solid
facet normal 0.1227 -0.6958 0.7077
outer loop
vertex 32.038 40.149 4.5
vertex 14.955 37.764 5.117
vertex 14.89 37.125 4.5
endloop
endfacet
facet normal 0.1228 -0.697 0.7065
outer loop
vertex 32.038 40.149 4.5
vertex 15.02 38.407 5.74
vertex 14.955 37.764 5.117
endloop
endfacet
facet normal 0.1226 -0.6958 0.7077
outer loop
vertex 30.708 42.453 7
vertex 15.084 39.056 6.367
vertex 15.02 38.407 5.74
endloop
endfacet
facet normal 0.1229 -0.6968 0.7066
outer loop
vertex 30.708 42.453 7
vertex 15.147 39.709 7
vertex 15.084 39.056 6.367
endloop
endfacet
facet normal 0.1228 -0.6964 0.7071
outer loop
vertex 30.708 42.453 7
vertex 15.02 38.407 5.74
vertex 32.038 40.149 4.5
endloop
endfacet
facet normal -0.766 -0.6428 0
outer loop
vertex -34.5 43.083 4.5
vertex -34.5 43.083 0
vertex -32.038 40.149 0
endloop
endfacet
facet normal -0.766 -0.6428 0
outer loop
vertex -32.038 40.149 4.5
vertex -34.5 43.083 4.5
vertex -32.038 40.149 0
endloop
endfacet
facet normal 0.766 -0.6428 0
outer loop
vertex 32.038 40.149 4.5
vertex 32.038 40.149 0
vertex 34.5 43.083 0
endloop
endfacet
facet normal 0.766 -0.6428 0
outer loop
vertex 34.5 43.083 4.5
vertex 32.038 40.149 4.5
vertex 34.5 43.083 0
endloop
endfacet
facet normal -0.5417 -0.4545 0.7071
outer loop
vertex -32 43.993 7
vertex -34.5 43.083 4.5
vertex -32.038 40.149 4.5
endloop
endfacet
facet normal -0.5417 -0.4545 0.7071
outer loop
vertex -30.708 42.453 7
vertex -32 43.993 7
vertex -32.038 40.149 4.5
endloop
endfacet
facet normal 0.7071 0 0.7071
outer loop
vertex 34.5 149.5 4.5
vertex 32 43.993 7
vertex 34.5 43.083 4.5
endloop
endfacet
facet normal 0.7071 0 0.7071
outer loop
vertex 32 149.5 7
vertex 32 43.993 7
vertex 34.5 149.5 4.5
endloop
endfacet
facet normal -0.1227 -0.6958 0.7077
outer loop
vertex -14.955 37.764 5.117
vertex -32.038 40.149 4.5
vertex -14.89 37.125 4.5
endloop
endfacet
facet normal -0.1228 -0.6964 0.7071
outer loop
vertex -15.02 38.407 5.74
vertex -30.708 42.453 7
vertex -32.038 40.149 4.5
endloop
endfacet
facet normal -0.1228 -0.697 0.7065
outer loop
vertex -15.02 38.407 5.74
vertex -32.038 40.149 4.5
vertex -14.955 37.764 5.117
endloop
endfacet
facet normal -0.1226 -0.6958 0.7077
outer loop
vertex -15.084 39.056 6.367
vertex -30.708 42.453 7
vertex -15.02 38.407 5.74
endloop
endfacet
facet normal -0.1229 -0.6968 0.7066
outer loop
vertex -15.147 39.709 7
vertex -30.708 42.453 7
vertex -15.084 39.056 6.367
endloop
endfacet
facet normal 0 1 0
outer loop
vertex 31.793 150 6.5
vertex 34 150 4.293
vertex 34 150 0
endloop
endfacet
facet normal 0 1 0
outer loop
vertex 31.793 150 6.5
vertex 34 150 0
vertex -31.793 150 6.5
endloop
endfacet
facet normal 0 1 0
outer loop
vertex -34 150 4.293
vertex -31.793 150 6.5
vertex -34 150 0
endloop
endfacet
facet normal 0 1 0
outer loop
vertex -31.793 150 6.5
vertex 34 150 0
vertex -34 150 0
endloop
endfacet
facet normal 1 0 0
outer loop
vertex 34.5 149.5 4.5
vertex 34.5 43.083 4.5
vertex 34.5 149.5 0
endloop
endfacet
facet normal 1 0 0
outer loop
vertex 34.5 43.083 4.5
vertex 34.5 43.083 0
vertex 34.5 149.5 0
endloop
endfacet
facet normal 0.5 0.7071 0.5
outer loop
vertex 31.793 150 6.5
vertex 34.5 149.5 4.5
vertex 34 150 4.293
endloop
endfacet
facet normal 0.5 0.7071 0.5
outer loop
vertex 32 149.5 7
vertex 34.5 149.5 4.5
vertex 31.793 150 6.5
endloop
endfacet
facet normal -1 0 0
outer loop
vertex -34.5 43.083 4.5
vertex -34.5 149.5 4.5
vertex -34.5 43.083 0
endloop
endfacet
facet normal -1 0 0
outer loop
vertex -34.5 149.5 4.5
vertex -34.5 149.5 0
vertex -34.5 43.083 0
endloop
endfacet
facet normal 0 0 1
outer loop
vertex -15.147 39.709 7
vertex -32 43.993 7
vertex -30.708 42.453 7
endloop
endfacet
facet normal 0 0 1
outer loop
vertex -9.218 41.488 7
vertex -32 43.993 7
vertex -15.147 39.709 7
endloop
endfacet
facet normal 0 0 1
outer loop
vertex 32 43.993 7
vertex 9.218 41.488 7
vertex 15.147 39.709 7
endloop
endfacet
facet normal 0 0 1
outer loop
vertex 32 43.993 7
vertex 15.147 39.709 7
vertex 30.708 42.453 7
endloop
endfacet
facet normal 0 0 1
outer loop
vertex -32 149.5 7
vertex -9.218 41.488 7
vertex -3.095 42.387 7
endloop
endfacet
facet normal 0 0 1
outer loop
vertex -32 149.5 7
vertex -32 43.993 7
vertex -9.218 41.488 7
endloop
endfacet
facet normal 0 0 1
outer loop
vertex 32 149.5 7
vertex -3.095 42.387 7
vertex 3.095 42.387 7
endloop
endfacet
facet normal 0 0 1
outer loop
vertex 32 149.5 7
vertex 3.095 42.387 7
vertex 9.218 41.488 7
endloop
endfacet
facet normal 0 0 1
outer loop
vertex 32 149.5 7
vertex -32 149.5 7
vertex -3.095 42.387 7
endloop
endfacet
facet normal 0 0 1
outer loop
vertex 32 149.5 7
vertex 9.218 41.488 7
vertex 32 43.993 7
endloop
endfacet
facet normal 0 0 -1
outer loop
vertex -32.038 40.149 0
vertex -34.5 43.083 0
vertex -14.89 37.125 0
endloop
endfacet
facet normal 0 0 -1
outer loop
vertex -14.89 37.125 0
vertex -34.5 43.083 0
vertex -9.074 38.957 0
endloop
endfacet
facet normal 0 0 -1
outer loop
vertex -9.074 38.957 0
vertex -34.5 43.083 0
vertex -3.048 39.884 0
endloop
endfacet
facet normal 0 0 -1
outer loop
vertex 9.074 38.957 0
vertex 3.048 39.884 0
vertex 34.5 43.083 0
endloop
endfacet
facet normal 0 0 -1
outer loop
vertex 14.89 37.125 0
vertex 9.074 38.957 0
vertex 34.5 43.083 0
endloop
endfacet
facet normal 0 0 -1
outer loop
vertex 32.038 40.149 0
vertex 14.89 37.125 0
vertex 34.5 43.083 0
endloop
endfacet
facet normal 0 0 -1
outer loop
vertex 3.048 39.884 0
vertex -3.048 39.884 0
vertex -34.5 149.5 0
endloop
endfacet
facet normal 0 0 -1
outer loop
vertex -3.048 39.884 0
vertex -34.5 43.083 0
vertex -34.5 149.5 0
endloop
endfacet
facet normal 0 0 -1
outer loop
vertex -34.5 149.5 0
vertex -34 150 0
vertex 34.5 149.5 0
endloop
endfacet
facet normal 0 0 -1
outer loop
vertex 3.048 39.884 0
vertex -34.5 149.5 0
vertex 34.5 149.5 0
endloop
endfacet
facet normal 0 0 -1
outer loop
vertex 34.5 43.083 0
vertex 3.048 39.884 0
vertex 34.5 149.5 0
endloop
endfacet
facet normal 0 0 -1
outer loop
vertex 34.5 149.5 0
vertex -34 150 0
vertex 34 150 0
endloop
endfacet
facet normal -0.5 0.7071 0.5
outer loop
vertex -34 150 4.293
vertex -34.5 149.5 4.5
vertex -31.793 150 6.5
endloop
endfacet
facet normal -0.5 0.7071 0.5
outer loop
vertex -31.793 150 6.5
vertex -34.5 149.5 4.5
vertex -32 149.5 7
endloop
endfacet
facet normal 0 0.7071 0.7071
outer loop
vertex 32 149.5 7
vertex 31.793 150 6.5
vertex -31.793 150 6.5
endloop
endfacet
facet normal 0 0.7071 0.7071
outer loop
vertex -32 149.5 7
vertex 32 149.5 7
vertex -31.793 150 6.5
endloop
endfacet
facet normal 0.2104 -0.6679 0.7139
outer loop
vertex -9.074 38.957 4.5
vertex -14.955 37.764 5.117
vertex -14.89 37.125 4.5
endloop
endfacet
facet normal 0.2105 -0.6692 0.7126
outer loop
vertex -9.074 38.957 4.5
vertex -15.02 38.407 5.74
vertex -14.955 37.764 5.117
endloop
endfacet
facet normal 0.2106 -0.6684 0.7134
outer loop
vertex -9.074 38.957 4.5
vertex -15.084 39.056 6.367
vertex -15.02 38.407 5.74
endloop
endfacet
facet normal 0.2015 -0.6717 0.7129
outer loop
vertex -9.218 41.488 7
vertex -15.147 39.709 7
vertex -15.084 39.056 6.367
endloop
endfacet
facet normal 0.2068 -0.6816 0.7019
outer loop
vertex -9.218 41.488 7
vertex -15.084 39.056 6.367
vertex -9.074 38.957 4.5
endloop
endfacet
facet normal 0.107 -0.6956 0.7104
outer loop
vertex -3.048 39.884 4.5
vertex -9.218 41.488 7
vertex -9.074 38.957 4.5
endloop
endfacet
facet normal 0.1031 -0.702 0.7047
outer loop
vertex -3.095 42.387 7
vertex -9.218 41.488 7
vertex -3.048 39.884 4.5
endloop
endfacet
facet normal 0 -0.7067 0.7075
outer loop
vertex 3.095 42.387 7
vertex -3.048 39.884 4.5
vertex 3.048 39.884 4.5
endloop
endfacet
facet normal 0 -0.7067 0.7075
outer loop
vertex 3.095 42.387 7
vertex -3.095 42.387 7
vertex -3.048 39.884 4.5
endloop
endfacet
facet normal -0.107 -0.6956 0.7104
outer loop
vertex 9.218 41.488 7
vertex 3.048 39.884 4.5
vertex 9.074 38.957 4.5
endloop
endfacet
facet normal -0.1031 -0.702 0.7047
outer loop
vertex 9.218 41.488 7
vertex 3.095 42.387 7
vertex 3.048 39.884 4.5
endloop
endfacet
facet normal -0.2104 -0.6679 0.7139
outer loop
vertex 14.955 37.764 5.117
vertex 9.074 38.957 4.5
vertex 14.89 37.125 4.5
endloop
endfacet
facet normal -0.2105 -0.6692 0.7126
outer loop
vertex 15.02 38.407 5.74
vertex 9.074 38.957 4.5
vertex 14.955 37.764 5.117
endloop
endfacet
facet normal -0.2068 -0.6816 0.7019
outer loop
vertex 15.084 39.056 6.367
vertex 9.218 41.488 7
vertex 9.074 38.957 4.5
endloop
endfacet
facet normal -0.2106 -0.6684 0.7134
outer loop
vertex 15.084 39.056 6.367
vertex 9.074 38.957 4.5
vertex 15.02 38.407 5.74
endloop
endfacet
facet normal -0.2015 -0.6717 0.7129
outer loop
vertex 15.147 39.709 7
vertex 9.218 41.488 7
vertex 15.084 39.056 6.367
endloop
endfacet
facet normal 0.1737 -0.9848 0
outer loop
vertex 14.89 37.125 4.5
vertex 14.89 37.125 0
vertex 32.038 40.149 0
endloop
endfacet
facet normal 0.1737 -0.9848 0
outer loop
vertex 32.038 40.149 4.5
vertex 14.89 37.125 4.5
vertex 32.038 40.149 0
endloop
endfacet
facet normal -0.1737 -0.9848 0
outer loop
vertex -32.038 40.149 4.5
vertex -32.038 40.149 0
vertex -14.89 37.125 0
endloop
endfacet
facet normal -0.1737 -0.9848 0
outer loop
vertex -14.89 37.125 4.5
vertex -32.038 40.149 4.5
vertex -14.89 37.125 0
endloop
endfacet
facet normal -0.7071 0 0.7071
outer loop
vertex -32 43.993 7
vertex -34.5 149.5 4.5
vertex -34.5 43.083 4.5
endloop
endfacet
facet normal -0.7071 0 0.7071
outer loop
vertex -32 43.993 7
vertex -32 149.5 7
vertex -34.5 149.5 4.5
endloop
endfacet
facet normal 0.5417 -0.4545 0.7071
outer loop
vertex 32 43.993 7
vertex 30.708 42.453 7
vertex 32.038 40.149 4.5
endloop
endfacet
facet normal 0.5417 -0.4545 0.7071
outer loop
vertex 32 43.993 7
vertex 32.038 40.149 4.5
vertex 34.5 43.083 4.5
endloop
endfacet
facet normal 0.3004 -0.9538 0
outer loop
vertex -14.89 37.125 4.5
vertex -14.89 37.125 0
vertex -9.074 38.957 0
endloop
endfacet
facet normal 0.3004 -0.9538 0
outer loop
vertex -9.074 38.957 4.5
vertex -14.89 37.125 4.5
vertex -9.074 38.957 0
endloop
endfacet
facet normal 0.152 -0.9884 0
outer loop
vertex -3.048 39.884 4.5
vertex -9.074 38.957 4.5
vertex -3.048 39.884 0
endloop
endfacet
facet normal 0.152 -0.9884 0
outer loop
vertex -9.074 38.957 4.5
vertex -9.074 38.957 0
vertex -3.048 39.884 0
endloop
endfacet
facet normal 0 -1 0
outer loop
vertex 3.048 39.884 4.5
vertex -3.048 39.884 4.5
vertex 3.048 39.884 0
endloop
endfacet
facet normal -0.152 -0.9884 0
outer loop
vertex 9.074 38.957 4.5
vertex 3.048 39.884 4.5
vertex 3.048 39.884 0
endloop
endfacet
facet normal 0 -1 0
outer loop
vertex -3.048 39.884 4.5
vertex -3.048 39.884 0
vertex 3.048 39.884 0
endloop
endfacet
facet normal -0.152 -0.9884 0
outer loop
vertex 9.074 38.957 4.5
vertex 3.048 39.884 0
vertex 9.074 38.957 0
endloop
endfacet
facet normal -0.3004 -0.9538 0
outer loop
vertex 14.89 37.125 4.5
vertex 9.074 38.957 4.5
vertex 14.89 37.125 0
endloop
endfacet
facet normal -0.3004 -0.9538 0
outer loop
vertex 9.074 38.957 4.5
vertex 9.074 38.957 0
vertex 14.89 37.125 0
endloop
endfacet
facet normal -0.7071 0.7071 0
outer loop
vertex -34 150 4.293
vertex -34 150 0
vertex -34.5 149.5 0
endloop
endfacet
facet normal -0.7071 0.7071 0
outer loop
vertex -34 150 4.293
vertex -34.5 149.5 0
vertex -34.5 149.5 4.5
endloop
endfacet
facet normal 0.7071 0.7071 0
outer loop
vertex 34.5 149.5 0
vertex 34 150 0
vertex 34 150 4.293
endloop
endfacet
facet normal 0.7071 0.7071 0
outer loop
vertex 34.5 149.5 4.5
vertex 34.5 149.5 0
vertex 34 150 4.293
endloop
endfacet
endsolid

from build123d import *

# Parameters (mm, degrees)
BOSS_EXTRUDE1_DEPTH  = 7
F_2_5MM_CHAMFER_SIZE = 2.5
F_0_5MM_CHAMFER_SIZE = 0.5


with BuildPart() as part:
    # Sketch1 → Boss-Extrude1 (new body)
    with BuildSketch(Plane.XY):
        with BuildLine():
            Line((-32.037980617, 40.14916039), (-14.889638473, 37.125444996))
            ThreePointArc((-14.889638473, 37.125444996), (0, 40), (14.889638473, 37.125444996))
            Line((14.889638473, 37.125444996), (32.037980617, 40.14916039))
            Line((32.037980617, 40.14916039), (34.5, 43.083280834))
            Line((34.5, 43.083280834), (34.5, 150))
            Line((34.5, 150), (-34.5, 150))
            Line((-34.5, 150), (-34.5, 43.083280834))
            Line((-34.5, 43.083280834), (-32.037980617, 40.14916039))
        make_face()
    extrude(amount=BOSS_EXTRUDE1_DEPTH)

    # 2,5mm Chamfer
    f_2_5mm_chamfer_edges = [part.edges().sort_by_distance(p)[0] for p in [
        (23.463809545, 38.637302693, 7),
        (33.268990309, 41.616220612, 7),
        (34.5, 96.541640417, 7),
        (-34.5, 96.541640417, 7),
        (-33.268990309, 41.616220612, 7),
        (-23.463809545, 38.637302693, 7),
        (0, 40, 7),
    ]]
    chamfer(f_2_5mm_chamfer_edges, length=F_2_5MM_CHAMFER_SIZE)

    # 0,5mm Chamfer
    f_0_5mm_chamfer_edges = [part.edges().sort_by_distance(p)[0] for p in [
        (-34.5, 150, 2.25),
        (0, 150, 7),
        (34.5, 150, 2.25),
        (33.25, 150, 5.75),
        (-33.25, 150, 5.75),
    ]]
    chamfer(f_0_5mm_chamfer_edges, length=F_0_5MM_CHAMFER_SIZE)


solid = part.part
